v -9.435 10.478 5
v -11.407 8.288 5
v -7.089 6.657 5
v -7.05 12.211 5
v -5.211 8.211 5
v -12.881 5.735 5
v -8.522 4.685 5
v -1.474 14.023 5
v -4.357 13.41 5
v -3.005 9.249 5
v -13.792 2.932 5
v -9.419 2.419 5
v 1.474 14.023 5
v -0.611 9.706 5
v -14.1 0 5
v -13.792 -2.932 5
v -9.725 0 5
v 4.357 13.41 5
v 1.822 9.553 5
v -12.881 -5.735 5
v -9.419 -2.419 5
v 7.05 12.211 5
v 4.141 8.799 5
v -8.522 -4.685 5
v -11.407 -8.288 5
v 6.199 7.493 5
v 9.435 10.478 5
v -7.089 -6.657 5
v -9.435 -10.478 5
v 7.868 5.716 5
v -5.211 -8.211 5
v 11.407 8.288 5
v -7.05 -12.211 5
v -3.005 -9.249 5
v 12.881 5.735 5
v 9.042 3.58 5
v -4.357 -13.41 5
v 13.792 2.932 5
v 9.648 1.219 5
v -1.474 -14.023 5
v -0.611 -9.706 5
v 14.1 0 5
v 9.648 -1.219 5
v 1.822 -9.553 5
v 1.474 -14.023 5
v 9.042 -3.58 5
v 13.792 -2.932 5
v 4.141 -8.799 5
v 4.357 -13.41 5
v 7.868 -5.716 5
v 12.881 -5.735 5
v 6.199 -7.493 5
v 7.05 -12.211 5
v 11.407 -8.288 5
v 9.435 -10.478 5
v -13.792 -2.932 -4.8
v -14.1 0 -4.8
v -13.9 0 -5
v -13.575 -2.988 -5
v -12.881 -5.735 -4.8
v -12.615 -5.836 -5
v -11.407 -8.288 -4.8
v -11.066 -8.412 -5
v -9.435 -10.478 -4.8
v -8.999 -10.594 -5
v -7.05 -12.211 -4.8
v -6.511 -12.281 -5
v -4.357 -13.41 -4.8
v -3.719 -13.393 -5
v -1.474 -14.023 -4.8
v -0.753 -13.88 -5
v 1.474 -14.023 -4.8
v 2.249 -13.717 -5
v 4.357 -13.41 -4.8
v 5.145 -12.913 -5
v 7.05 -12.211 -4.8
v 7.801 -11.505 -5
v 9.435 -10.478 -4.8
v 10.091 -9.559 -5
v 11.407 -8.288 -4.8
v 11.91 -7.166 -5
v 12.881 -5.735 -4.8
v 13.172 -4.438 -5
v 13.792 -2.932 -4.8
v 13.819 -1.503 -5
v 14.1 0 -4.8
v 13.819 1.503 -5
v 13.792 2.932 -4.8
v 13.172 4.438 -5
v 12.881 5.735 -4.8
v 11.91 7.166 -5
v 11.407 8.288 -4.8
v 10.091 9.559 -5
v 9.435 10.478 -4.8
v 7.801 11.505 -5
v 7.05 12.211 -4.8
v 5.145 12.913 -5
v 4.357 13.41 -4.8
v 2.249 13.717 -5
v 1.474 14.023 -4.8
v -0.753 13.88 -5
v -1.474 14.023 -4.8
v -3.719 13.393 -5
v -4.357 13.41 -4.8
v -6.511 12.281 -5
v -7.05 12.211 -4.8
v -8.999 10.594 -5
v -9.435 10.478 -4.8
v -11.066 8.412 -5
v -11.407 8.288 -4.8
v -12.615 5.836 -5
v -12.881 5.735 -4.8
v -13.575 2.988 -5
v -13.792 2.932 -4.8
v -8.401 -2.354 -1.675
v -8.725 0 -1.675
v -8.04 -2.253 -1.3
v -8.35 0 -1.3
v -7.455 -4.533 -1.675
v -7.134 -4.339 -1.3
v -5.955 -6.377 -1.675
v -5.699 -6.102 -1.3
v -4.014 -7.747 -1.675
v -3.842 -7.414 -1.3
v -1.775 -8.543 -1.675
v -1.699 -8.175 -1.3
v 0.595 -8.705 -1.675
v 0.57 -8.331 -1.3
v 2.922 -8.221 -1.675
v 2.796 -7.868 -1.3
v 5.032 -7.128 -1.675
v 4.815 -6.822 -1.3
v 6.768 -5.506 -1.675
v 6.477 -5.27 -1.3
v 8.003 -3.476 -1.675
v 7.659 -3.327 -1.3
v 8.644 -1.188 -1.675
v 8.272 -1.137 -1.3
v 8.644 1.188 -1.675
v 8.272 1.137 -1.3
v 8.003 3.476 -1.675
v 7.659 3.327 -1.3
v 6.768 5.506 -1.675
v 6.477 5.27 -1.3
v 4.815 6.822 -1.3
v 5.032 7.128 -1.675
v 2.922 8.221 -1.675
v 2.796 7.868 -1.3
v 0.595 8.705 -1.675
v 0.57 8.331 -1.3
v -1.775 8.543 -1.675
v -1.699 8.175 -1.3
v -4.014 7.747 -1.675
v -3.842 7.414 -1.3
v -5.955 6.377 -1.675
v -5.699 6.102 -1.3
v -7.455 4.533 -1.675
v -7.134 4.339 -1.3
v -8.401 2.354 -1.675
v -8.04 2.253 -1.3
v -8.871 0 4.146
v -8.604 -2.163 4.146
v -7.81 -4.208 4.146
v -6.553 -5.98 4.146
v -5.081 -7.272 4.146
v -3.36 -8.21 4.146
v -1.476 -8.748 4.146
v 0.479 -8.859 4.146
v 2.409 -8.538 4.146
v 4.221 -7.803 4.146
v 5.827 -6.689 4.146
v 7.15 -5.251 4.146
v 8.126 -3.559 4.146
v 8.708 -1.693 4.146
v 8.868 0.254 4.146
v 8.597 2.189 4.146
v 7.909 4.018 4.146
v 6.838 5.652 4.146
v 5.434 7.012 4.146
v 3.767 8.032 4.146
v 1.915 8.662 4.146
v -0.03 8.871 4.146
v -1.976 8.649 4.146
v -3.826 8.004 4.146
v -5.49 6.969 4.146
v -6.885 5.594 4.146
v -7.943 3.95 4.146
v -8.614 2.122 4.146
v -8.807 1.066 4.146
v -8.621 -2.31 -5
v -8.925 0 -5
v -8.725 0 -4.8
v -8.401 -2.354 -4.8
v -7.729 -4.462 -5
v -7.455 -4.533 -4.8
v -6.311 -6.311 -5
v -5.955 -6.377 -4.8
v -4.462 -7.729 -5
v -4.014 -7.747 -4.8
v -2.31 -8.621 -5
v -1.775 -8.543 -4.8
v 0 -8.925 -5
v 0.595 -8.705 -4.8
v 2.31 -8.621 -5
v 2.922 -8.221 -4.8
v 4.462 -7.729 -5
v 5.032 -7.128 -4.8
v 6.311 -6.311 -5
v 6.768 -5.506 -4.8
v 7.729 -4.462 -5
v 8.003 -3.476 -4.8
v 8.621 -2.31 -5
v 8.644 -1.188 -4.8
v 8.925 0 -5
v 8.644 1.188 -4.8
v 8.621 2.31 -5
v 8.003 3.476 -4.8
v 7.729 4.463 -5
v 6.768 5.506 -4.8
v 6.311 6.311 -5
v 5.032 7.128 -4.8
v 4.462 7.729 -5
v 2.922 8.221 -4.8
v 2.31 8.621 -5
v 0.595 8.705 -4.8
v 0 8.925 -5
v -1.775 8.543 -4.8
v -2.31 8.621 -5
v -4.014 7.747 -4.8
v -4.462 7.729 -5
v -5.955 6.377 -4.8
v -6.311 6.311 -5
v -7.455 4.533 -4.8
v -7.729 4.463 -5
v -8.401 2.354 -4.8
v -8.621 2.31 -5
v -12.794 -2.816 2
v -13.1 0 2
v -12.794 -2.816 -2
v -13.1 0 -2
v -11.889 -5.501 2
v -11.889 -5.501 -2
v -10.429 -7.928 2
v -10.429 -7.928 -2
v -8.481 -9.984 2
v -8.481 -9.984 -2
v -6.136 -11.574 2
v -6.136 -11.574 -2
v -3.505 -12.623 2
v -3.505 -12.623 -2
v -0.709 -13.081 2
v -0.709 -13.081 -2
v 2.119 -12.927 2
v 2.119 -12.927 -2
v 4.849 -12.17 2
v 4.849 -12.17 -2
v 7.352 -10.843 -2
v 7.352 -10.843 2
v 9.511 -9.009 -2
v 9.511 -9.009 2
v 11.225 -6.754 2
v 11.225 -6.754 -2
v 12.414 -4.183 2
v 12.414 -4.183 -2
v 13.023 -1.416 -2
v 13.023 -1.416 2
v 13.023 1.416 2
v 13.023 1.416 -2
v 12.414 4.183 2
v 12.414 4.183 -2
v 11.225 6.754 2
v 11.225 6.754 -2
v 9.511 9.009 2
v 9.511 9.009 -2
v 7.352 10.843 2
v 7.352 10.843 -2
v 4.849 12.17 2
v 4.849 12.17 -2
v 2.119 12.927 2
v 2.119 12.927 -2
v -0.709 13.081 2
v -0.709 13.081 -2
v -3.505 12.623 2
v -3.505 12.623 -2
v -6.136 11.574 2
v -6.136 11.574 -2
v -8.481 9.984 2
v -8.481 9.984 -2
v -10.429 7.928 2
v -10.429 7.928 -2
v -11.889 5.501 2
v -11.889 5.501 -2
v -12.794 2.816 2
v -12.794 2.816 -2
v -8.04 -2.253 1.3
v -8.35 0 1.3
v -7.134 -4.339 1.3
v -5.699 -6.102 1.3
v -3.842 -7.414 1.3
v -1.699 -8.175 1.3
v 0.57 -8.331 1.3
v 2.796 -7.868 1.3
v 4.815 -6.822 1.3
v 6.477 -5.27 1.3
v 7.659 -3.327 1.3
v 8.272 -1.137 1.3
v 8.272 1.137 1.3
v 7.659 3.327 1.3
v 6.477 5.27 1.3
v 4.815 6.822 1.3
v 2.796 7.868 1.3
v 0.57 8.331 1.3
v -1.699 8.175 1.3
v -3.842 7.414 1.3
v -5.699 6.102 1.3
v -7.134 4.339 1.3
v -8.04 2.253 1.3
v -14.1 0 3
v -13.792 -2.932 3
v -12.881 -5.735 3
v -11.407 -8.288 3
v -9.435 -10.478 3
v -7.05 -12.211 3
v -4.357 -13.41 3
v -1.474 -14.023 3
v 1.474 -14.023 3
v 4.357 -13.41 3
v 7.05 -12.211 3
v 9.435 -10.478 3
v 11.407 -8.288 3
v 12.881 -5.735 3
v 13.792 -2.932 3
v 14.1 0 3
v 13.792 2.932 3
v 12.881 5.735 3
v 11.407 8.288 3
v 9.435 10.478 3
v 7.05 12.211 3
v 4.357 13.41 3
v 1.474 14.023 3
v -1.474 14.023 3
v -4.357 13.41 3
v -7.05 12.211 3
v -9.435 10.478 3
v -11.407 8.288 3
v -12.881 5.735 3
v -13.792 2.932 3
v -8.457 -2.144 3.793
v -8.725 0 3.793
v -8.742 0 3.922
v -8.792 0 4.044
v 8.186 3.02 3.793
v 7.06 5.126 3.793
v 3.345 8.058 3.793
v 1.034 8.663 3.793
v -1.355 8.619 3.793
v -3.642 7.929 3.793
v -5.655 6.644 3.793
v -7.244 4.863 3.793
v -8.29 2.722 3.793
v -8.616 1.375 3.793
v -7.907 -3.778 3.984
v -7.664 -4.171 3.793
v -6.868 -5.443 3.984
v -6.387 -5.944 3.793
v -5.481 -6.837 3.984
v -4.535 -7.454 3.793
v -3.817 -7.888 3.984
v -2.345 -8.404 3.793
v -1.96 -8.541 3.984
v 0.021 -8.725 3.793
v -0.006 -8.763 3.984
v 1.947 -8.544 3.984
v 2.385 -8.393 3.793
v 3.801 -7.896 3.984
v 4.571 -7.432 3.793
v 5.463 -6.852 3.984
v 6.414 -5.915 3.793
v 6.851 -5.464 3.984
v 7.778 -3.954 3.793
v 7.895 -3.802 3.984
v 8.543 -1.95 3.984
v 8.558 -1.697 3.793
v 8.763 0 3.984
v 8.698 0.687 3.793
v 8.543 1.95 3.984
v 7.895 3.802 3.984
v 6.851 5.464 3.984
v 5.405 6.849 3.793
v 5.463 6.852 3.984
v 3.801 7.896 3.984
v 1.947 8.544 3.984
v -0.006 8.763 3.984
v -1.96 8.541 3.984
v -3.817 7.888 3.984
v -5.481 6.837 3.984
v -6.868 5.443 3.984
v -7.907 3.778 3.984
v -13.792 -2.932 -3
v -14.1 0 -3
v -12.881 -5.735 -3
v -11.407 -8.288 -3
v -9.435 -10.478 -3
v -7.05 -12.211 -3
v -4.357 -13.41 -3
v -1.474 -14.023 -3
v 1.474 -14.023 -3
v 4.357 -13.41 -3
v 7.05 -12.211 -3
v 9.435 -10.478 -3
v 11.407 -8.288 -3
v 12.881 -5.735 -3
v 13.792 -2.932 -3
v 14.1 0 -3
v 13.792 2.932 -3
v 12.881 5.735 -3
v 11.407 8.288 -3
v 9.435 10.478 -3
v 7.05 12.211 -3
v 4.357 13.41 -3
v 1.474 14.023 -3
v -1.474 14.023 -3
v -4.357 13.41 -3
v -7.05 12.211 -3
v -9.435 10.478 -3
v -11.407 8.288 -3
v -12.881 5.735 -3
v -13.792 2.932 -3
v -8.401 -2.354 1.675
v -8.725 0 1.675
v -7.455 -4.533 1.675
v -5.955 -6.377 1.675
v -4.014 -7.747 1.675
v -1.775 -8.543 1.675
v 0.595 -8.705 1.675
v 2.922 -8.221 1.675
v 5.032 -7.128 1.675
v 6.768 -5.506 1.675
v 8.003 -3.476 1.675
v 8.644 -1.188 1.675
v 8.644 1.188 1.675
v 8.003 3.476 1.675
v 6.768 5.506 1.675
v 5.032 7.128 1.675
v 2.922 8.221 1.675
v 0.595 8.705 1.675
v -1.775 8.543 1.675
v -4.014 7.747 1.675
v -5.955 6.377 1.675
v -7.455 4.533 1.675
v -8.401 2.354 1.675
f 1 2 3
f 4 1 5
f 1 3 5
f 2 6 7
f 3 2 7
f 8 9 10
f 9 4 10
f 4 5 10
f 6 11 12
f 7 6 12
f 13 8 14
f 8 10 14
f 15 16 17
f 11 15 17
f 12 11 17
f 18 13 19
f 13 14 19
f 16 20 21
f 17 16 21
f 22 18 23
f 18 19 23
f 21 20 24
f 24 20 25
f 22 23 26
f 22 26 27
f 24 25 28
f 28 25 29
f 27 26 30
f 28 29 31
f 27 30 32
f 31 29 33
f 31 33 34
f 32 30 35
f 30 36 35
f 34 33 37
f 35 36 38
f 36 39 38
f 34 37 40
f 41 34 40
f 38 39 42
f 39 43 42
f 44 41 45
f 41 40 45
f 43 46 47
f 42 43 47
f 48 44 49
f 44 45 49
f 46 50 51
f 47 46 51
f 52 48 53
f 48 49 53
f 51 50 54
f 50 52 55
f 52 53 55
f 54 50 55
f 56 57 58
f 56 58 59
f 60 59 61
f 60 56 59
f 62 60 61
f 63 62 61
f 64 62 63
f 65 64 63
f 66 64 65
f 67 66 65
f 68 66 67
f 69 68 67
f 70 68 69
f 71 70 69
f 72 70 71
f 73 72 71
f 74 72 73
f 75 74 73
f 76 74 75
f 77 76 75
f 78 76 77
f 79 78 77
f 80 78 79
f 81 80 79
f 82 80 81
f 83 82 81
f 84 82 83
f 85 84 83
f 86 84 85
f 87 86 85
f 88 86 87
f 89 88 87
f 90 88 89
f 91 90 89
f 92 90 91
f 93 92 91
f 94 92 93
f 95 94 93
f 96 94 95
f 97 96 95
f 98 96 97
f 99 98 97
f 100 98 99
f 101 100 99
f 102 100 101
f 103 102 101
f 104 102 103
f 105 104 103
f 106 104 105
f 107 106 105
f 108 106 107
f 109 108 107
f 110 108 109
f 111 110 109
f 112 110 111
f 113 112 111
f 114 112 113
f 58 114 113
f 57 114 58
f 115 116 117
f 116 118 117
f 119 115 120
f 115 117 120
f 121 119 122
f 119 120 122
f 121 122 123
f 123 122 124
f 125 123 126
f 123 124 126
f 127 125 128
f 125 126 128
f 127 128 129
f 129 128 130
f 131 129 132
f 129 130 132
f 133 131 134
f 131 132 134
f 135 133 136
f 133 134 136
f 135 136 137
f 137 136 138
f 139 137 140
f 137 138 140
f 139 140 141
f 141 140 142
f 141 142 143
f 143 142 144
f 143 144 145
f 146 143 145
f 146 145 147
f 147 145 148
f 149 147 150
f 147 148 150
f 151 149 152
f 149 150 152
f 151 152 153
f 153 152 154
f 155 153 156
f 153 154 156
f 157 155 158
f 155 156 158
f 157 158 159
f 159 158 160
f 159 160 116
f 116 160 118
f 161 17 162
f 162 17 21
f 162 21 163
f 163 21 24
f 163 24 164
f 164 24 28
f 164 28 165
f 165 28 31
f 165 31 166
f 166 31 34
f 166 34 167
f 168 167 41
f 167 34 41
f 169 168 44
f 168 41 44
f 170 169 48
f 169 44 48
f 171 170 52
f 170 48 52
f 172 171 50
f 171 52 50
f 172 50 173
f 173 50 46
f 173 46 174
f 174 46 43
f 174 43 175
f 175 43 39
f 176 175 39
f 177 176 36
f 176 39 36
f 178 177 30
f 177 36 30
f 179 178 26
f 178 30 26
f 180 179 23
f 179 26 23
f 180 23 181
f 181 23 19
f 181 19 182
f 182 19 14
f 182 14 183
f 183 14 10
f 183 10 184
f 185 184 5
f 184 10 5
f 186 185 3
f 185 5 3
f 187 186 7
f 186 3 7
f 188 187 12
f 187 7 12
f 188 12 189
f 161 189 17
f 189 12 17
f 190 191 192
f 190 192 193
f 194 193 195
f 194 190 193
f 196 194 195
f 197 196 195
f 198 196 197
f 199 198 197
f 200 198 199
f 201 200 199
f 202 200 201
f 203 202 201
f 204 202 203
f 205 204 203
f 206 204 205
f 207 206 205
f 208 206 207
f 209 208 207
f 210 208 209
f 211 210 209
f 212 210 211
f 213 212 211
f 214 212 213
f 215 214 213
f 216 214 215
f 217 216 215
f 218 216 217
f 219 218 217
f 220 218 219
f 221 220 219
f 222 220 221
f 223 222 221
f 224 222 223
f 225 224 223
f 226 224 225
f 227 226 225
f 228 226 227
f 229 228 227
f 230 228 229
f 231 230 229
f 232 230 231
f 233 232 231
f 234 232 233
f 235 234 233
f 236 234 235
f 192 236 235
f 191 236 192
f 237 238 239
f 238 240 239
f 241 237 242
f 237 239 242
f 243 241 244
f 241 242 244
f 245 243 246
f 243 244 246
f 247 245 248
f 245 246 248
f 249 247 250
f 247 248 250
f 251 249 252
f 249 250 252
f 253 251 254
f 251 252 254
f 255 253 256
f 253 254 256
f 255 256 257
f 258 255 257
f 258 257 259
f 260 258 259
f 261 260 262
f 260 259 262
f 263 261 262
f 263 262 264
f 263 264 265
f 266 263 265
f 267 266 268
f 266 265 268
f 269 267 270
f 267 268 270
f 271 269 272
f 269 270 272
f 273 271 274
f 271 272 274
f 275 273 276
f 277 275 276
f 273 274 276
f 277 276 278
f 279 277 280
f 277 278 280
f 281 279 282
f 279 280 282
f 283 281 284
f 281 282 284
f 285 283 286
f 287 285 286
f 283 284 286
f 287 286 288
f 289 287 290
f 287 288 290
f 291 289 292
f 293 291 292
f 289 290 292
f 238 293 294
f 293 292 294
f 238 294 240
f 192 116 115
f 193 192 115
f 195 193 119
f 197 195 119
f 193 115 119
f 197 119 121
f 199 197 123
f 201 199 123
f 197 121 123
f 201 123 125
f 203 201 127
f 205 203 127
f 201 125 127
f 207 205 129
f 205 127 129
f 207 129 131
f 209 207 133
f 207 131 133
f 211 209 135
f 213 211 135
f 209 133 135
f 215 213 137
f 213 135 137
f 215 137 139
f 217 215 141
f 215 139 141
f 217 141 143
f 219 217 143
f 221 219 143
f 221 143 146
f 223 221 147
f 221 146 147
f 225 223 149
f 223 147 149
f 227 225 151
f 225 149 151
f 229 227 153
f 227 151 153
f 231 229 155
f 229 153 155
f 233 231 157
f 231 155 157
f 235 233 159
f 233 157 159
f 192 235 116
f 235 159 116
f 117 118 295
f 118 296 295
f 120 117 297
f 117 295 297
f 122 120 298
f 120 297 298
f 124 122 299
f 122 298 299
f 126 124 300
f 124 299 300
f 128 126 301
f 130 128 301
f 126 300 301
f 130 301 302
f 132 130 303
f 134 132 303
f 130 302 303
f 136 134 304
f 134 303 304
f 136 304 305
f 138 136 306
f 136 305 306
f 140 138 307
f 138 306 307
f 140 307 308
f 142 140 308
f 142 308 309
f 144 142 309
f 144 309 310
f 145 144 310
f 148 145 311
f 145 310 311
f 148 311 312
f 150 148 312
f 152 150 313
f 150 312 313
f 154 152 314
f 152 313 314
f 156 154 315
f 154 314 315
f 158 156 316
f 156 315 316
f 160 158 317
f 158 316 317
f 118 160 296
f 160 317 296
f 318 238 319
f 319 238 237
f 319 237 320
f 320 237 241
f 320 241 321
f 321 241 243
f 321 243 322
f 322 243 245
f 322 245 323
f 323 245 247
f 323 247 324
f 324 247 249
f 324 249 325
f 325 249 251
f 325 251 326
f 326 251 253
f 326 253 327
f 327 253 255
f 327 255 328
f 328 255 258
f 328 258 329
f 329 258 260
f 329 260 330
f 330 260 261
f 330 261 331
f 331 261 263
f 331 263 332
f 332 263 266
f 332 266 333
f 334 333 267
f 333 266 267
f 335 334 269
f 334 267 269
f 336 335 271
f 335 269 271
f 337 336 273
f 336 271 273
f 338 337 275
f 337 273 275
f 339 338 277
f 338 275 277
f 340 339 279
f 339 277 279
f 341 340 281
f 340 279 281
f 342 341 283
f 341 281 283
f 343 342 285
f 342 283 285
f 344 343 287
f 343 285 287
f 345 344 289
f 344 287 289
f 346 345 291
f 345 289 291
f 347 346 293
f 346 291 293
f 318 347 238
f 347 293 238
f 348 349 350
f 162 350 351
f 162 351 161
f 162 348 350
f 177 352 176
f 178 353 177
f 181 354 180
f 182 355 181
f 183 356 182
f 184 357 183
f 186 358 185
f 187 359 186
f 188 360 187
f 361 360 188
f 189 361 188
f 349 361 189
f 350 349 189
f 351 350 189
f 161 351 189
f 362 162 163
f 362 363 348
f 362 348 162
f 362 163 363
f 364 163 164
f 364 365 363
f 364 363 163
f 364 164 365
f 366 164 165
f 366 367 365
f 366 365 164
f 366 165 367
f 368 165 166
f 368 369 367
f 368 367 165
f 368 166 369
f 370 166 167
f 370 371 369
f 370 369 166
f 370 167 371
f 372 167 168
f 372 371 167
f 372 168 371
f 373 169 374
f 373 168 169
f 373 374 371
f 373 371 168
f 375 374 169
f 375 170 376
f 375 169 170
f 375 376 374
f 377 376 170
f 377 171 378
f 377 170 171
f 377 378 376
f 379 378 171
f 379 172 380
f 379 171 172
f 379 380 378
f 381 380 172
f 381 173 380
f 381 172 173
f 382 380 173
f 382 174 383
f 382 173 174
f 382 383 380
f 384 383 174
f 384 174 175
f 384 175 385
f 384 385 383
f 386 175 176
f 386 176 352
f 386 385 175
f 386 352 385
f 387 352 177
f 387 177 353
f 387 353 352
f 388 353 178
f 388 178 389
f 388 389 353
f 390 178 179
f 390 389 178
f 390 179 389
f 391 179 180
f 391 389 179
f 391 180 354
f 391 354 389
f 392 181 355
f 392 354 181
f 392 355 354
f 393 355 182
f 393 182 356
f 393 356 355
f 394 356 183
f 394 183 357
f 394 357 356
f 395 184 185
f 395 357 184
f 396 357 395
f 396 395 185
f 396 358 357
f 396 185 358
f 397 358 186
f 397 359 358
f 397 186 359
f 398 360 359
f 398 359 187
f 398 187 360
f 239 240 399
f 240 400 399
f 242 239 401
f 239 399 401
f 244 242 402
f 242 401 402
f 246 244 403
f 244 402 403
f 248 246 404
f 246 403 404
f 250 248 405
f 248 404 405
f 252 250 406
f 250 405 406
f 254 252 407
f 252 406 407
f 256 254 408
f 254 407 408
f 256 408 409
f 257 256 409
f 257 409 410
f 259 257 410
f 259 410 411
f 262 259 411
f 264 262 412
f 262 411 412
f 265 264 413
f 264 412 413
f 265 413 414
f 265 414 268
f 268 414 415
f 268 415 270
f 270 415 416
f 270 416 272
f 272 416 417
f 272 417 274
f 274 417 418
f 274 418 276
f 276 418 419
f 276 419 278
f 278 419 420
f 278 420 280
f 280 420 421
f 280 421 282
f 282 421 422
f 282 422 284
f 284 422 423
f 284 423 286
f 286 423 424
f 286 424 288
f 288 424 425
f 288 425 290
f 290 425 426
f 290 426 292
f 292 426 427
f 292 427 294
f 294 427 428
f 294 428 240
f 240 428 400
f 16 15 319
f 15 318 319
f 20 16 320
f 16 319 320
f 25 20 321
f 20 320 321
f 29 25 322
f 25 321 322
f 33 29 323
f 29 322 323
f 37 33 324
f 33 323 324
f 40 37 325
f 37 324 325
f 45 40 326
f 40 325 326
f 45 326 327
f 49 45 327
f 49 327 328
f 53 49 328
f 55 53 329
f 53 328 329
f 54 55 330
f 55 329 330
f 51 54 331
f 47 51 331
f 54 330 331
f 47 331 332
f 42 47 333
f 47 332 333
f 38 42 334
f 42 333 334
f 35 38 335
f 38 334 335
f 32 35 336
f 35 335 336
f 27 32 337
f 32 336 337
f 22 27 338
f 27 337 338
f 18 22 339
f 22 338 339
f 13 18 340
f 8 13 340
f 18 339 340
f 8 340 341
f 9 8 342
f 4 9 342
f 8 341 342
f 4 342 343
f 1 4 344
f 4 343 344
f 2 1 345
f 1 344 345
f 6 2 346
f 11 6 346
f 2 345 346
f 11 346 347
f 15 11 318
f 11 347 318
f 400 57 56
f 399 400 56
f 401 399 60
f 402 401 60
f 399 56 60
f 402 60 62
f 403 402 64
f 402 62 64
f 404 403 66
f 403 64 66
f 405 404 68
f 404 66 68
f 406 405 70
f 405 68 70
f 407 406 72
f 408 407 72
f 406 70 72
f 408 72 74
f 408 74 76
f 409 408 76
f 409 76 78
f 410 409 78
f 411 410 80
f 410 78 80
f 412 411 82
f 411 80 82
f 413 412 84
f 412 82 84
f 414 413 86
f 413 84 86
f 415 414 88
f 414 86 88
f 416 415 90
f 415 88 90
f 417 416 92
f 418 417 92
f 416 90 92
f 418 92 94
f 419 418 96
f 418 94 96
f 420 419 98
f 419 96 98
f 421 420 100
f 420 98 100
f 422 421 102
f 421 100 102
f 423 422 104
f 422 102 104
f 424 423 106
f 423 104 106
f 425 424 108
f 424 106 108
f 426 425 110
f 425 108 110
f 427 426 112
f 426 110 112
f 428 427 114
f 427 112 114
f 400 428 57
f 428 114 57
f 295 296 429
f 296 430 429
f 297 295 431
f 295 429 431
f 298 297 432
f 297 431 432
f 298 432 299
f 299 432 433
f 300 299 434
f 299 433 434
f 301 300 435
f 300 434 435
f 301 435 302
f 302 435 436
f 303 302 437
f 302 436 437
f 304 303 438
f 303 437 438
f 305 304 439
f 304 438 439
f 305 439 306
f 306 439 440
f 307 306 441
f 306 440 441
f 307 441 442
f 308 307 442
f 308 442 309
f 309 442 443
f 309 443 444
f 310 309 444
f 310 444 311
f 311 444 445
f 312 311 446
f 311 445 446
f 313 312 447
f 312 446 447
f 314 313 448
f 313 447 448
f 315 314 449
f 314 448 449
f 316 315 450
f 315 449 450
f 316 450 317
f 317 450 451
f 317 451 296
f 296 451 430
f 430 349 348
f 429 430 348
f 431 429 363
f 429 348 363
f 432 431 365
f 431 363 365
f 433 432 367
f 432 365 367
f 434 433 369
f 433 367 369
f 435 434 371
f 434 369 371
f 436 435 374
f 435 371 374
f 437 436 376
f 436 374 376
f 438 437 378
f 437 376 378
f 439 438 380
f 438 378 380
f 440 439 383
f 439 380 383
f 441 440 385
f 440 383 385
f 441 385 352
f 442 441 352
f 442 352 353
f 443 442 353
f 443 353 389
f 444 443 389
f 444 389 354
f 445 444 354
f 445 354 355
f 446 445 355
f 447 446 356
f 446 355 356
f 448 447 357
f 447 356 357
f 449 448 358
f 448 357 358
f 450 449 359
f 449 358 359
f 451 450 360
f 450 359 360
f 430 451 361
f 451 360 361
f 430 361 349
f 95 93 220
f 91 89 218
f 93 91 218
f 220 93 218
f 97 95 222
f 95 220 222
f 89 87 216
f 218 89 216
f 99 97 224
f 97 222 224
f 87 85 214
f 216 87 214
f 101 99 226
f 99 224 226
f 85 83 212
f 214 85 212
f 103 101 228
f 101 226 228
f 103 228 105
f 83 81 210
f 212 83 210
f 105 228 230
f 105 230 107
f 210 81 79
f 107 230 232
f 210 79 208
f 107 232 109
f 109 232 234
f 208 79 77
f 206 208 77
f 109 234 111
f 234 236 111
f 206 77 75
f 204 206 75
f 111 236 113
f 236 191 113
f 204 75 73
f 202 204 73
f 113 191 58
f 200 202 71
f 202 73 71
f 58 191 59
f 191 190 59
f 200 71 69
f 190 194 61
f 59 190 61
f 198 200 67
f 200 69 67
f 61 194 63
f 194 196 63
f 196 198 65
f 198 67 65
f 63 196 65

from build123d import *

# Parameters (mm, degrees)
F2_SIZE = 1
F3_R    = 0.5
F4_SIZE = 0.2


with BuildPart() as f1:
    # F0 (on Front) → F1 (revolve)
    with BuildSketch(Plane.XZ):
        Polygon((-8.35, -1.3), (-8.35, 0), (-8.35, 1.3), (-8.725, 1.675), (-8.725, 5), (-14.1, 5), (-14.1, 3), (-13.1, 2), (-13.1, 0), (-13.1, -2), (-14.1, -3), (-14.1, -5), (-8.725, -5), (-8.725, -1.675), align=None)
    revolve(axis=Axis((0, 0, 7.7657741494), (0, 0, 1)))

    # F2
    f2_edges = [f1.edges().sort_by_distance(p)[0] for p in [
        (8.725, 0, 5),
    ]]
    chamfer(f2_edges, length=F2_SIZE)

    # F3
    f3_edges = [f1.edges().sort_by_distance(p)[0] for p in [
        (8.725, 0, 4),
    ]]
    fillet(f3_edges, radius=F3_R)

    # F4
    f4_edges = [f1.edges().sort_by_distance(p)[0] for p in [
        (14.1, 0, -5),
        (8.725, 0, -5),
    ]]
    chamfer(f4_edges, length=F4_SIZE)


solid = f1.part
